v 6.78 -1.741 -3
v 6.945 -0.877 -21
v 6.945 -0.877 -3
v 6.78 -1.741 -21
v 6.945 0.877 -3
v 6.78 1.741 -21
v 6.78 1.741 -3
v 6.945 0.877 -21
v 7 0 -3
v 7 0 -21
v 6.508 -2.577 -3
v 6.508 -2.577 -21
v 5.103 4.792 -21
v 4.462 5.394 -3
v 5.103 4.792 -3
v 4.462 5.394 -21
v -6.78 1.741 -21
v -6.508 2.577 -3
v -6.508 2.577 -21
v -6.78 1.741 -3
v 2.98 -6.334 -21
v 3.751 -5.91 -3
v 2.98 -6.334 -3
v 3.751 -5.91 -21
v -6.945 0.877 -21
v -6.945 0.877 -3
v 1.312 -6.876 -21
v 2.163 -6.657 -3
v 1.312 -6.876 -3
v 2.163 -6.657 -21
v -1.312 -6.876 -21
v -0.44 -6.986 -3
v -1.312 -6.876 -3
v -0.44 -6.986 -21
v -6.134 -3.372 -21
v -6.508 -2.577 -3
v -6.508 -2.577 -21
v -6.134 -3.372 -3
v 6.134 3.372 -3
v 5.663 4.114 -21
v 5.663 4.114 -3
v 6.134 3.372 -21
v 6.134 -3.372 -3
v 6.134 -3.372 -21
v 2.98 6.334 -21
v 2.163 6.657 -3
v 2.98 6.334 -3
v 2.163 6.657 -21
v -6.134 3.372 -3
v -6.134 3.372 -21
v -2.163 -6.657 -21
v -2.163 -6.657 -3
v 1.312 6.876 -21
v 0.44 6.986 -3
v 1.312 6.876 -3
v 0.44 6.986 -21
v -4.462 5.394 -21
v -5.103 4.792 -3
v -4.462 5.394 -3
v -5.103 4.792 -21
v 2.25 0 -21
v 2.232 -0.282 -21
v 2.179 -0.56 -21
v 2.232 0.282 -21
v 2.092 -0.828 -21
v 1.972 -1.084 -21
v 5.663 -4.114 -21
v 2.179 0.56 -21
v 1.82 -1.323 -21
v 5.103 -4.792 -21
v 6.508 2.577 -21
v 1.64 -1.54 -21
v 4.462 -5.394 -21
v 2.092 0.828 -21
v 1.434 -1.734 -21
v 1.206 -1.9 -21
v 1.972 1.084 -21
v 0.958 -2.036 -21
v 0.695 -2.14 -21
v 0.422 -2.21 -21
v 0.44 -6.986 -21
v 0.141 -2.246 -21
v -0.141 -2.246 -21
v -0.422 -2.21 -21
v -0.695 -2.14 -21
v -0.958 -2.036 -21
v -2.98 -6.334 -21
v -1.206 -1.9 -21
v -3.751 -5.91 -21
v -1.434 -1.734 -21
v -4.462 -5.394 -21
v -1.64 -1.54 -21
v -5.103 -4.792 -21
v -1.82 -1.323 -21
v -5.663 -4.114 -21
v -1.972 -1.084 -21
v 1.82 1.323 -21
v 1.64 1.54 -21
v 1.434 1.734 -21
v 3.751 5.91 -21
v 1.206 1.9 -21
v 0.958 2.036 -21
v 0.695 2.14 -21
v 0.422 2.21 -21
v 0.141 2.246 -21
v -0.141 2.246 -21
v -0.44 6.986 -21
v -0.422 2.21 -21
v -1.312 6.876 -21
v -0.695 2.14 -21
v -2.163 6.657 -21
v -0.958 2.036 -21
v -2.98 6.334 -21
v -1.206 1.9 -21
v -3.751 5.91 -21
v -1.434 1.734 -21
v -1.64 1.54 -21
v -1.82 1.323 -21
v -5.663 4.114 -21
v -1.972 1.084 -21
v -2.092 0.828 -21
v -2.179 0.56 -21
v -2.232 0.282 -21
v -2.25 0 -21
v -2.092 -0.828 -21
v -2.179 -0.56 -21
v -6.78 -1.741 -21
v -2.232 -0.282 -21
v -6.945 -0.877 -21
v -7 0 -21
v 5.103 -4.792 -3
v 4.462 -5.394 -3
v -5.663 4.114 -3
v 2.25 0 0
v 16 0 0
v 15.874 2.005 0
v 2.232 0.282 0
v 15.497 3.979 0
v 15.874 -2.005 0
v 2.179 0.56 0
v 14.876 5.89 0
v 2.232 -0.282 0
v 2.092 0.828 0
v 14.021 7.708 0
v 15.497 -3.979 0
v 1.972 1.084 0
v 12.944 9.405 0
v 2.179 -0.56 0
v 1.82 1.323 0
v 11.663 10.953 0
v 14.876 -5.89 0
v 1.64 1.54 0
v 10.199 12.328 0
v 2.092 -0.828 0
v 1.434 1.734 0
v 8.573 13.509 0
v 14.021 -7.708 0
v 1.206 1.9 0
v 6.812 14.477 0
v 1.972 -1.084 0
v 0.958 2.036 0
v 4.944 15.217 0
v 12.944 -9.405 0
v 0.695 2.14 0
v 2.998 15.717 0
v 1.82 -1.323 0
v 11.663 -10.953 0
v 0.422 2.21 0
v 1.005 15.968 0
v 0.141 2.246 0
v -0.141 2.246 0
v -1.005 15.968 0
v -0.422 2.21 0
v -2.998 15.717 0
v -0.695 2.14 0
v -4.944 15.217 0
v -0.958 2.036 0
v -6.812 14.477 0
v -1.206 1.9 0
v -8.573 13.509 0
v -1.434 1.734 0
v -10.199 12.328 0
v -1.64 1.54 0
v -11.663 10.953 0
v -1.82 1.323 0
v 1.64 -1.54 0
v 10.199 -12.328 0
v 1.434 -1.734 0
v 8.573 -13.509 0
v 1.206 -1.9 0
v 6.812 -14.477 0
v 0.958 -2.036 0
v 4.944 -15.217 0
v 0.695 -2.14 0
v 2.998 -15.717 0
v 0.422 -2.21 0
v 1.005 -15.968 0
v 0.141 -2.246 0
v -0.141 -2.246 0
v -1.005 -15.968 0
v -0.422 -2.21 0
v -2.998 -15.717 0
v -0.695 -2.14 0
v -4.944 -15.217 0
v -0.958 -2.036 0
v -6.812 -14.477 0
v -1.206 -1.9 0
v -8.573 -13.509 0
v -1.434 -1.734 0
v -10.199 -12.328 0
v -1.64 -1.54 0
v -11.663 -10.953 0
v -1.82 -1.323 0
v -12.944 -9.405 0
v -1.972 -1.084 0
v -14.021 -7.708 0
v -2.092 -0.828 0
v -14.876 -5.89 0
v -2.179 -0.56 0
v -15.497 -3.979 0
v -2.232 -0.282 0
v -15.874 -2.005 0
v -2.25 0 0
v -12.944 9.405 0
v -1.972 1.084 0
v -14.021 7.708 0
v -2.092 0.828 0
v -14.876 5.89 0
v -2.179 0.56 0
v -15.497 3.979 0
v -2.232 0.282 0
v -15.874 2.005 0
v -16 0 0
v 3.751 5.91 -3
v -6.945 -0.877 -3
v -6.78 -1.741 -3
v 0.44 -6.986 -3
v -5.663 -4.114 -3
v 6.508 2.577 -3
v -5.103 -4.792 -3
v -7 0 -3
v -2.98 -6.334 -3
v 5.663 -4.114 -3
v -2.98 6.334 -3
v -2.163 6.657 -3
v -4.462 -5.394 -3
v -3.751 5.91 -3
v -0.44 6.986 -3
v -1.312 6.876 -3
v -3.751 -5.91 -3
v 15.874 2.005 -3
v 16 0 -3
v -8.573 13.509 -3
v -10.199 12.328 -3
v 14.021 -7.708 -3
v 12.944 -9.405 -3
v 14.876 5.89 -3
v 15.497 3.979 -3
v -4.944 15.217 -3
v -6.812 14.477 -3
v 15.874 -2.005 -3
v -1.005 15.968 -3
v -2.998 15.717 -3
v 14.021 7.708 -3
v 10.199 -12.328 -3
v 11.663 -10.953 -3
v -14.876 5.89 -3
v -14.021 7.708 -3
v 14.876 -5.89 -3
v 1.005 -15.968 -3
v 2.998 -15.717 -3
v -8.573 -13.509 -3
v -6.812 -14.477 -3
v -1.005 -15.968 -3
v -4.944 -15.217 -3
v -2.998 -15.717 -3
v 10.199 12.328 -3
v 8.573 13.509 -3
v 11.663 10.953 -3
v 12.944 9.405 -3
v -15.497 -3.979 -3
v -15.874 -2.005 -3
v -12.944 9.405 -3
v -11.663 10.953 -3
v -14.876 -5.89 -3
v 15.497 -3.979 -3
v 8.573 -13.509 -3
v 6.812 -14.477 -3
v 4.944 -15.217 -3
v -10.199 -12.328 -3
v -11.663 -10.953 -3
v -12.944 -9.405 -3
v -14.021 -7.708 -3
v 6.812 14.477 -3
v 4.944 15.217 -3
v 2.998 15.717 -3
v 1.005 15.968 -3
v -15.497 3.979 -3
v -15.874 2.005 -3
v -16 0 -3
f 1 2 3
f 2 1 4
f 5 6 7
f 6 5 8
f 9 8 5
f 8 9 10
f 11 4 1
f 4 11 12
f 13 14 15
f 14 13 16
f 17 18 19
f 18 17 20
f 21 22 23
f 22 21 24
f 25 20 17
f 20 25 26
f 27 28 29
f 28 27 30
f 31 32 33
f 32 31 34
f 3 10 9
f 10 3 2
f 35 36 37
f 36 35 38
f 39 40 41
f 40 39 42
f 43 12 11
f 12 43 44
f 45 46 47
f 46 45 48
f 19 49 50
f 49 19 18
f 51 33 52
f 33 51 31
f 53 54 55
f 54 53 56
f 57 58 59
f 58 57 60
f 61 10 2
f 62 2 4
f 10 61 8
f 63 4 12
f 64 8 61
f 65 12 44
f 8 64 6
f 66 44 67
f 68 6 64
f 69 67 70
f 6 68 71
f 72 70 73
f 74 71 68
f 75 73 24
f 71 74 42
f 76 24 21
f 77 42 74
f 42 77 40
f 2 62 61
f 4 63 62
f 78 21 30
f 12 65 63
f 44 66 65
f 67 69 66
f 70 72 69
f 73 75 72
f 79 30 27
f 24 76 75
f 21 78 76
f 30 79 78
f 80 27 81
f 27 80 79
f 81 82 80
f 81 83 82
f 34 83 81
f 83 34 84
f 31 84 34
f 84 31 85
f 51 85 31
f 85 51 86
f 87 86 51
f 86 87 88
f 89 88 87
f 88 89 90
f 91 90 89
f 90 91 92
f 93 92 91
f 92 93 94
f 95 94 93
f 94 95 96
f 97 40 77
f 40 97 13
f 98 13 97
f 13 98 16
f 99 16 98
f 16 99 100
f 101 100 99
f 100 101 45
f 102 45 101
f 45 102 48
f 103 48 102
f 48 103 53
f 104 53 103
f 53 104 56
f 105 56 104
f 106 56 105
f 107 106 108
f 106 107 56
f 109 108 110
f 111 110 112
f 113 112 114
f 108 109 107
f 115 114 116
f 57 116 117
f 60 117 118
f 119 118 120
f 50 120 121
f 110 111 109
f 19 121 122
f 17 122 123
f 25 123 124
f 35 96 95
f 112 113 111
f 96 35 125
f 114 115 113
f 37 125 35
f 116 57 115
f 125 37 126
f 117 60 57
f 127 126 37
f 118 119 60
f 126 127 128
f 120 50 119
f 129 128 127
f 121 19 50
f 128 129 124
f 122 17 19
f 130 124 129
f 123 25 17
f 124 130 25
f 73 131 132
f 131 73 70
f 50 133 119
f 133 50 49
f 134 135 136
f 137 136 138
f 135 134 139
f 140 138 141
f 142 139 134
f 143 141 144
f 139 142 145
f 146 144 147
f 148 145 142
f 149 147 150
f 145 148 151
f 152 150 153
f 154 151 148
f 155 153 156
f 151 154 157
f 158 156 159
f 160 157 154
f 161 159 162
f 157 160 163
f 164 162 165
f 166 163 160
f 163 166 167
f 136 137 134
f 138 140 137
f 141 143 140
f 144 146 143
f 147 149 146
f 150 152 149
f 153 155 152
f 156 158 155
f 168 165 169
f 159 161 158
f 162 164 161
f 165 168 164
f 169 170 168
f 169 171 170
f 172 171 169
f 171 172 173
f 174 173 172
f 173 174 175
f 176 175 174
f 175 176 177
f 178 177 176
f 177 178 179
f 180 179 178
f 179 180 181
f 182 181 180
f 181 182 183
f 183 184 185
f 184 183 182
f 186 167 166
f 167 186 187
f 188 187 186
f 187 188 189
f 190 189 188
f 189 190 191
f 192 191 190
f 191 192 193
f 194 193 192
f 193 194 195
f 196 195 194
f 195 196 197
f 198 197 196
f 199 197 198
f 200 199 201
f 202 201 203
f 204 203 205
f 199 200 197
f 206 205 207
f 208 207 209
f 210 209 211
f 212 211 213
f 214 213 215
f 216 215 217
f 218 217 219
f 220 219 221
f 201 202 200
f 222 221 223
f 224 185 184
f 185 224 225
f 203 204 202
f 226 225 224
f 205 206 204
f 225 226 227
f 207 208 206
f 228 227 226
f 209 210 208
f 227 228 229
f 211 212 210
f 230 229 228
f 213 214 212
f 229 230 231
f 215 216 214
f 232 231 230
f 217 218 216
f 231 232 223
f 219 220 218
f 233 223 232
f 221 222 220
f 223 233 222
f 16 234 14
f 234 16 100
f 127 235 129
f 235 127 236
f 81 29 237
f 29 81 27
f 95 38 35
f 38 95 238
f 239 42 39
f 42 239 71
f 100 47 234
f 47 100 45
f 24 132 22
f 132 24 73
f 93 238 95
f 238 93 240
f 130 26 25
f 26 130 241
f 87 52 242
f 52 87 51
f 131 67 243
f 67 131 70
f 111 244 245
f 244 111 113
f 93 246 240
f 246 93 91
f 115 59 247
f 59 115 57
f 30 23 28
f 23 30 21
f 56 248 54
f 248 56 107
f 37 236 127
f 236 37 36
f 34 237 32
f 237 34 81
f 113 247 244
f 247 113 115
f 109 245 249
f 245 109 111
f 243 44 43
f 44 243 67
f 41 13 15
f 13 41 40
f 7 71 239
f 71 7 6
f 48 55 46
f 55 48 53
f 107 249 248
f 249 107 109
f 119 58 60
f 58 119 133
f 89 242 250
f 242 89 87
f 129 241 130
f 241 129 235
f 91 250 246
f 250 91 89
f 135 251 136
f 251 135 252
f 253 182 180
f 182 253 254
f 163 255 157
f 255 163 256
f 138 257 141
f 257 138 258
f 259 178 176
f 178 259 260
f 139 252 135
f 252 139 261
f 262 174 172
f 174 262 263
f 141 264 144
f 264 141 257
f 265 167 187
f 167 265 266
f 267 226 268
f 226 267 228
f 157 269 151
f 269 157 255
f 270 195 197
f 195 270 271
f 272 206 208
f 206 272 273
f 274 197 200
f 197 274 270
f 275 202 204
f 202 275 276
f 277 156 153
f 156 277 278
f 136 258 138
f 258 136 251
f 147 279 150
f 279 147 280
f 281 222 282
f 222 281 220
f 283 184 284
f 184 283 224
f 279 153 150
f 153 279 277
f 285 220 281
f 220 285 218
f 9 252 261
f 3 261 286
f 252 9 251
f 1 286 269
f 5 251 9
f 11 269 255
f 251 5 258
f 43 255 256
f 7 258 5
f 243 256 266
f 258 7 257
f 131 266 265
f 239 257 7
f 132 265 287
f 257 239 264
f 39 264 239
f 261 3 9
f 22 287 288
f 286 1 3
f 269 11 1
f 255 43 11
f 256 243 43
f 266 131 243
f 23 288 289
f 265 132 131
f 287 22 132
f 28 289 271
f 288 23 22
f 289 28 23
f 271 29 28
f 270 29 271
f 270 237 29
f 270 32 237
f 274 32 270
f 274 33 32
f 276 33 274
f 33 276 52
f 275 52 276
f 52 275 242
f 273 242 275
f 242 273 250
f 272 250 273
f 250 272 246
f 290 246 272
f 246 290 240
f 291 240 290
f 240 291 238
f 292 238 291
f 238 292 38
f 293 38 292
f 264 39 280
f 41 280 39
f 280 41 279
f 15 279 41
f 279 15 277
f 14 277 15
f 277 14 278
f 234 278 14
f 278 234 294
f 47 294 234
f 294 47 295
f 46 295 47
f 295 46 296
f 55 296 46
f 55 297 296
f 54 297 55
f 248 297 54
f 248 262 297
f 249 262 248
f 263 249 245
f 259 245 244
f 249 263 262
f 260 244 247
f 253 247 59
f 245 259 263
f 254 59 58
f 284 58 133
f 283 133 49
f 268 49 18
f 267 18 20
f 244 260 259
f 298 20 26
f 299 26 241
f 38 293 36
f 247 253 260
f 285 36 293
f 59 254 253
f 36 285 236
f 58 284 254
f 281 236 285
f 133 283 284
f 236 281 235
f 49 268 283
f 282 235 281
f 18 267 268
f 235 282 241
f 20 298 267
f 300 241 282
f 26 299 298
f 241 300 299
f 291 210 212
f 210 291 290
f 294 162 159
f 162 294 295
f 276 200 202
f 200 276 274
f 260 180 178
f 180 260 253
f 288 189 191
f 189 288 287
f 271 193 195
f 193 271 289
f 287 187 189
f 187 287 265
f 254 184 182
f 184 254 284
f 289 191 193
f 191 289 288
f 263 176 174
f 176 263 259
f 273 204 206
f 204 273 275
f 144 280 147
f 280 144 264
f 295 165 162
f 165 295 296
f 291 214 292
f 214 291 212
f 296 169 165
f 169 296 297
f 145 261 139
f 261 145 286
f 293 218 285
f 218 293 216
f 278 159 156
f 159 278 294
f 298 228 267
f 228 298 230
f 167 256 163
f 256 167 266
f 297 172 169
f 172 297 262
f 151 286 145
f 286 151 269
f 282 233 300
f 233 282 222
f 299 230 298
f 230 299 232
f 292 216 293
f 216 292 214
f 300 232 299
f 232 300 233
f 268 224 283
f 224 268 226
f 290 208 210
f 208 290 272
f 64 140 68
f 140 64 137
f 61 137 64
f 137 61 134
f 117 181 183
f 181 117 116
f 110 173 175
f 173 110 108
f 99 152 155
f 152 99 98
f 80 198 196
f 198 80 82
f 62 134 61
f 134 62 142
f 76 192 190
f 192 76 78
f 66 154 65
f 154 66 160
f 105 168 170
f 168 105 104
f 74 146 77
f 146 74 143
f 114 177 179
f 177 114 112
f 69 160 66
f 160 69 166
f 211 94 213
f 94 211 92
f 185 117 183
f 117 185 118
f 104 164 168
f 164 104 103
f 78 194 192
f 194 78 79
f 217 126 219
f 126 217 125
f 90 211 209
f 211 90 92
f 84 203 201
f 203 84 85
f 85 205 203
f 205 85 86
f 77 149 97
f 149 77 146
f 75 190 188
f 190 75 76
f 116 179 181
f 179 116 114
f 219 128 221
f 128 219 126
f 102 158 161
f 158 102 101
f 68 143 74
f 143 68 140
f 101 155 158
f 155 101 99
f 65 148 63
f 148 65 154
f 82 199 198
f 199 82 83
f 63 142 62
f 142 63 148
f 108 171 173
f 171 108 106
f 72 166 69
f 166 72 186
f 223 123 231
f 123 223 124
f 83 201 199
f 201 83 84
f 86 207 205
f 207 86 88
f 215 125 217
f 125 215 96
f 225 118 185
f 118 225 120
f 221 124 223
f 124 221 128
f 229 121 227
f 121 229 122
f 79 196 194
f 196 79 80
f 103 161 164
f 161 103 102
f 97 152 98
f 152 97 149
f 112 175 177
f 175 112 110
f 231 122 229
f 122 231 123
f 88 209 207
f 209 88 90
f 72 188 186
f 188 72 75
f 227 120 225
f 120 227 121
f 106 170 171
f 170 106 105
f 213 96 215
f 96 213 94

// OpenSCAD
$fn = 50;


difference() {
	union() {
		translate(v = [0, 0, -21.0000000000]) {
			cylinder(h = 21, r = 7.0000000000);
		}
		translate(v = [0, 0, -3.0000000000]) {
			cylinder(h = 3, r = 16.0000000000);
		}
	}
	union() {
		#translate(v = [0, 0, -21]) {
			cylinder(h = 21, r = 2.2500000000);
		}
	}
}
